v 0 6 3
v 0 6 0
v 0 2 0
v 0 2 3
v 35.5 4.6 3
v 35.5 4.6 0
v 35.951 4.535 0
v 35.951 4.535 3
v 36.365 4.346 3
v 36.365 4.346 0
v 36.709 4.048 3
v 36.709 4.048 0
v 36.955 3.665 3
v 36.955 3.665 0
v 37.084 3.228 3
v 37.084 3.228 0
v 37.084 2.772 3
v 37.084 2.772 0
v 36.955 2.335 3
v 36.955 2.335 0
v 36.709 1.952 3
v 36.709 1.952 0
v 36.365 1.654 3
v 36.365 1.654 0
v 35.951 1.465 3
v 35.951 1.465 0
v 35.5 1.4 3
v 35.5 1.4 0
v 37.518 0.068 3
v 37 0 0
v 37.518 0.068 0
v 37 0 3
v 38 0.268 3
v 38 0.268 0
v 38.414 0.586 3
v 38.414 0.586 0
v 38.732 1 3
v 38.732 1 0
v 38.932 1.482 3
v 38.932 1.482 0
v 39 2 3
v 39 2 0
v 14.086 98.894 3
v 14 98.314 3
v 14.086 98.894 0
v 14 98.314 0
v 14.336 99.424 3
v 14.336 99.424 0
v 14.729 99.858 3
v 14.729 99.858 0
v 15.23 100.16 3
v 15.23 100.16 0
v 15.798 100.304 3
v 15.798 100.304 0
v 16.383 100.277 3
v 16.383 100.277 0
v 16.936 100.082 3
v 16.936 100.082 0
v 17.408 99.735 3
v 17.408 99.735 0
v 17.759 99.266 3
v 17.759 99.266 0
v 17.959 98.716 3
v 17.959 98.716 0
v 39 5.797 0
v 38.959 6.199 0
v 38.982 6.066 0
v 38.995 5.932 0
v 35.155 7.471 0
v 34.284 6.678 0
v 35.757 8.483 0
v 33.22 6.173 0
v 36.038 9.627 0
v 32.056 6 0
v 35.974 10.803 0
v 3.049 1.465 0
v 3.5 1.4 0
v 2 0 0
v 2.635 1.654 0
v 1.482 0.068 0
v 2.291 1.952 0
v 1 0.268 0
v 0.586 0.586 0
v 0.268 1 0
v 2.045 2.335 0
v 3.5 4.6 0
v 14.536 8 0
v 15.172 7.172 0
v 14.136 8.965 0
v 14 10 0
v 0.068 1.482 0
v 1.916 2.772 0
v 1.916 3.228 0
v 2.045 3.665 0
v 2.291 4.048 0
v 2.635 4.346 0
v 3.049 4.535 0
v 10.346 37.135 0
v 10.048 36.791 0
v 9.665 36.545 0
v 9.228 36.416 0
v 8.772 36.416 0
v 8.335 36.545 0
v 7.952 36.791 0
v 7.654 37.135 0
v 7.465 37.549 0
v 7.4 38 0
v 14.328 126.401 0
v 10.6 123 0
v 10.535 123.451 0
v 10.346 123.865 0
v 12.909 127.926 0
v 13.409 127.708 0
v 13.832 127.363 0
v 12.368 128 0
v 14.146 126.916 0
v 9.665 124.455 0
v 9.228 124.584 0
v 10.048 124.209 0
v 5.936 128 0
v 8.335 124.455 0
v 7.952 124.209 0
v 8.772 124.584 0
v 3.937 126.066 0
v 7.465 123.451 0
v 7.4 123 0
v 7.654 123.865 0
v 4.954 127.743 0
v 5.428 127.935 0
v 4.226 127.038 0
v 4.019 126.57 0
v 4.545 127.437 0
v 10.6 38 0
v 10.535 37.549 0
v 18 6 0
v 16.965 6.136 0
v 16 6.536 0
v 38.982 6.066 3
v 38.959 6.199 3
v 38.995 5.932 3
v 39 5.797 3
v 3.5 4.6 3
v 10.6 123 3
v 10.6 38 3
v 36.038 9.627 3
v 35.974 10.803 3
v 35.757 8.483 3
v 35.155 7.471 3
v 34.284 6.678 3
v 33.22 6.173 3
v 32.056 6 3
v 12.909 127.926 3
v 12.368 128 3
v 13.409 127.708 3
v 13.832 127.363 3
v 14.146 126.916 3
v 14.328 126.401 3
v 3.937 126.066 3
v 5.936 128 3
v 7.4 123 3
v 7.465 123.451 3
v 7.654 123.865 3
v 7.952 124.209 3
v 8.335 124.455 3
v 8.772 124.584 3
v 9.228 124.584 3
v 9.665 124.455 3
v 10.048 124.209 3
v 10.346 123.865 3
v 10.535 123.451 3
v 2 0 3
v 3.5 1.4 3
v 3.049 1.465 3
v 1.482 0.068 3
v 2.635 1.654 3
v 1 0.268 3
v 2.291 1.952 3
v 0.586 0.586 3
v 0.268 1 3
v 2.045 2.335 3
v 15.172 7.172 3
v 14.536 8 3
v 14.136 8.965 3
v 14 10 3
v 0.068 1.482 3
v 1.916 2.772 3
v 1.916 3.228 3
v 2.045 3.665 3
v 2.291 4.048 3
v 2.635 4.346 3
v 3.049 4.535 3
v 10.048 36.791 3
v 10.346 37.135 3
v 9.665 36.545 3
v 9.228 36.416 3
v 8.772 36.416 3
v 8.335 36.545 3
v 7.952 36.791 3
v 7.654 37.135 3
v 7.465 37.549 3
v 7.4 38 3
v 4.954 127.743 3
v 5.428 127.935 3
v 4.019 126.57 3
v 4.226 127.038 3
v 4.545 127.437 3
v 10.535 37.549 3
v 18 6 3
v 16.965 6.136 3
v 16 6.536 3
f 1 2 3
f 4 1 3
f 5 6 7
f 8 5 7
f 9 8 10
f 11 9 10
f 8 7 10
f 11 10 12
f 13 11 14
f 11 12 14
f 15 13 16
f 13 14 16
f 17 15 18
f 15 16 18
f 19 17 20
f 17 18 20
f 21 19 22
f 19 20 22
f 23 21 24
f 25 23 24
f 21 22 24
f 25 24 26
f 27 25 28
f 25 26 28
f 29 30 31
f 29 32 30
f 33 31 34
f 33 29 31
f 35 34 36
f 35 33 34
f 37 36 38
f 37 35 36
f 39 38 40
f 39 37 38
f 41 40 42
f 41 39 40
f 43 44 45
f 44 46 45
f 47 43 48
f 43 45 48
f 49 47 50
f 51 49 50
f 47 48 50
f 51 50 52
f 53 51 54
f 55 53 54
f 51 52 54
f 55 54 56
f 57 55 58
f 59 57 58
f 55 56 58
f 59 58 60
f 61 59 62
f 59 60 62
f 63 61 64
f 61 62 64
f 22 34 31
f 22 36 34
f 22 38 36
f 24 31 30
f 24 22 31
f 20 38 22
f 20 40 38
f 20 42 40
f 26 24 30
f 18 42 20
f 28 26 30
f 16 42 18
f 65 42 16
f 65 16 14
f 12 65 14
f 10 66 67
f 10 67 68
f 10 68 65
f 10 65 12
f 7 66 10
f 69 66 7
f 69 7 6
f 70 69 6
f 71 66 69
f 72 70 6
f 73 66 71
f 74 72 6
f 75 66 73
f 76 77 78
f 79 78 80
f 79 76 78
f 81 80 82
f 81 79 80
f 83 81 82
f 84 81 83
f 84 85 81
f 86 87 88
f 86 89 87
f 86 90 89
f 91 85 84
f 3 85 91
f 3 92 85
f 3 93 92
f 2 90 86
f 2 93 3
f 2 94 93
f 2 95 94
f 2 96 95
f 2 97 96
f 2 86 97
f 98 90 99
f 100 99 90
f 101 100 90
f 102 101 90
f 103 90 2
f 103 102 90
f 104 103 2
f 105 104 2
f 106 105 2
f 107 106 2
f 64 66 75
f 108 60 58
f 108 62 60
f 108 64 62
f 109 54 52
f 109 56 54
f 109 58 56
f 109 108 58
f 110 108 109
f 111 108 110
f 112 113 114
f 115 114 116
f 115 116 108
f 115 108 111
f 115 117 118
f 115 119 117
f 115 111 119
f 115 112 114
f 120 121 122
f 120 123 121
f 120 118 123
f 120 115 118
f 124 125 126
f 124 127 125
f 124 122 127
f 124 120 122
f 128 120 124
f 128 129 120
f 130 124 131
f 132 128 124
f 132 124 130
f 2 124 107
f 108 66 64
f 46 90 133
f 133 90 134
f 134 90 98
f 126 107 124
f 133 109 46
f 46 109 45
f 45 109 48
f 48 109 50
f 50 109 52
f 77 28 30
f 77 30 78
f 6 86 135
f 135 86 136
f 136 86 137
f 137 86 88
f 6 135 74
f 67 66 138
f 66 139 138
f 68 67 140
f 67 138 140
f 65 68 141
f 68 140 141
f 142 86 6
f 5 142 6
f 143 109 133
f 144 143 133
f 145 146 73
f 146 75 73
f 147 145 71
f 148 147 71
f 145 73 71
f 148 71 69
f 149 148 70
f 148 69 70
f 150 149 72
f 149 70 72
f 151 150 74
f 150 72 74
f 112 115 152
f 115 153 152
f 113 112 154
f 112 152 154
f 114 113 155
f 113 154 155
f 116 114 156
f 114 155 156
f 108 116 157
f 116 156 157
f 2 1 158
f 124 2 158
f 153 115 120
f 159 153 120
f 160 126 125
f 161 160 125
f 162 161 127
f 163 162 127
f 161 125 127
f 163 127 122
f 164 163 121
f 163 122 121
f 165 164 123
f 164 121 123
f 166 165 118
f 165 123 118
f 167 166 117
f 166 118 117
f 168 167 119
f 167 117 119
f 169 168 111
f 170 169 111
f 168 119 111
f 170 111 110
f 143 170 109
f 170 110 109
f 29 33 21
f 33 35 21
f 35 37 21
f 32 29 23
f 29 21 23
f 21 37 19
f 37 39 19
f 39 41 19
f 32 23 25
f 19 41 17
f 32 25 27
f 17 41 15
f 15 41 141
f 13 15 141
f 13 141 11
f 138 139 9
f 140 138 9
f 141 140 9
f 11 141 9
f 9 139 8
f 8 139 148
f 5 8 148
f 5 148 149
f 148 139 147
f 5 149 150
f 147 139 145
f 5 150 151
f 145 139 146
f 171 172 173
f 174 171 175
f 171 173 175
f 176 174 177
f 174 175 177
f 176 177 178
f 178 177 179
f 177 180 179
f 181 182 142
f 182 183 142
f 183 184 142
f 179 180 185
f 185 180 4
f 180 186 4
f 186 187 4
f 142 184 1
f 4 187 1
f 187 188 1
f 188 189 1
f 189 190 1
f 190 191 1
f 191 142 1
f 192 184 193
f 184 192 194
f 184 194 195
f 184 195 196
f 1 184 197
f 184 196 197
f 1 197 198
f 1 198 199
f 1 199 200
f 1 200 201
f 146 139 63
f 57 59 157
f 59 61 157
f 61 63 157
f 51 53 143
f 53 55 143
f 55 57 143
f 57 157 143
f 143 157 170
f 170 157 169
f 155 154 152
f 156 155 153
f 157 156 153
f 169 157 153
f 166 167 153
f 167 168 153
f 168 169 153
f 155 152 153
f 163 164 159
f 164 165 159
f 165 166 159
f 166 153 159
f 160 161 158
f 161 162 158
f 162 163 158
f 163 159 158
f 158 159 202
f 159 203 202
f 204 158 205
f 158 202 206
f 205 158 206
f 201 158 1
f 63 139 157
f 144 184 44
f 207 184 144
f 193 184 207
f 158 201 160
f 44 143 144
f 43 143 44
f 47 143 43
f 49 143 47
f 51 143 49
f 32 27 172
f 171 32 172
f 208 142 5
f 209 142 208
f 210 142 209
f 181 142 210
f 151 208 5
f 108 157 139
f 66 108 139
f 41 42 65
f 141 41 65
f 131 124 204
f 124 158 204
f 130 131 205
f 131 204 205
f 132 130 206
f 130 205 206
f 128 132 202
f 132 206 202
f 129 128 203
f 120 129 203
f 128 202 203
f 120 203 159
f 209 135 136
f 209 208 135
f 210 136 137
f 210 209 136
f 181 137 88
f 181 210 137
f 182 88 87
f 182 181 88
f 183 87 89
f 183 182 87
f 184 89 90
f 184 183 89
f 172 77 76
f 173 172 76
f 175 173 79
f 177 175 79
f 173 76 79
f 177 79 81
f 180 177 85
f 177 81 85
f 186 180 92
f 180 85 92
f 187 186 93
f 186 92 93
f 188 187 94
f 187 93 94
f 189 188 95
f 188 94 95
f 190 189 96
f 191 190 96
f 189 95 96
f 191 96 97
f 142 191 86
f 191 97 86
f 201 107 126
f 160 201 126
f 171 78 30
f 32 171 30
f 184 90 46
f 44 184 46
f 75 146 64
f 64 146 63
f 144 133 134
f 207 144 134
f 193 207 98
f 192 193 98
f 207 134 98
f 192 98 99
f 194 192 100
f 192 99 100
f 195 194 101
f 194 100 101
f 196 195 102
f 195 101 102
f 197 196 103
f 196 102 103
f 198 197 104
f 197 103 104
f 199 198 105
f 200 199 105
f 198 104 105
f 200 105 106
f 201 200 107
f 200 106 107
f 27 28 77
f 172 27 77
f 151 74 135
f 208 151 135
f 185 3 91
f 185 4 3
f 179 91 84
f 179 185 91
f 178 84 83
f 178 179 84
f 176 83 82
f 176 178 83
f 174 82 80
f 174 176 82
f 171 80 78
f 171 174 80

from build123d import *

# Parameters (mm, degrees)
EXTRUDE_1_DEPTH = 3
EXTRUDE_2_DEPTH = 3
FILLET_1_R      = 2
FILLET_2_R      = 4
FILLET_3_R      = 2


with BuildPart() as part:
    # 草图1 → 凸台-拉伸1 (new body)
    with BuildSketch(Plane.XY):
        Polygon((0, 0), (39, 0), (39, 6), (14, 6), (14, 128), (4, 128), (4, 6), (0, 6), align=None)
        with BuildLine():
            Line((3.5, 4.6), (35.5, 4.6))
            ThreePointArc((35.5, 4.6), (37.1, 3), (35.5, 1.4))
            Line((35.5, 1.4), (3.5, 1.4))
            ThreePointArc((3.5, 1.4), (1.9, 3), (3.5, 4.6))
        make_face(mode=Mode.SUBTRACT)
        with BuildLine():
            Line((7.4, 38), (7.4, 123))
            ThreePointArc((7.4, 123), (9, 124.6), (10.6, 123))
            Line((10.6, 123), (10.6, 38))
            ThreePointArc((10.6, 38), (9, 36.4), (7.4, 38))
        make_face(mode=Mode.SUBTRACT)
    extrude(amount=EXTRUDE_1_DEPTH)

    # 草图2 → 凸台-拉伸2 (add)
    with BuildSketch(Plane.XY.offset(3)):
        Polygon((0, 6), (4, 128), (4, 6), align=None)
        Polygon((14, 128), (39, 6), (36.9584404, 6), (14, 118.037189152), align=None)
    extrude(amount=-EXTRUDE_2_DEPTH)

    # 圆角1
    fillet_1_edges = [part.edges().sort_by_distance(p)[0] for p in [
        (0, 6, 1.5),
        (4, 128, 1.5),
        (14, 128, 1.5),
        (39, 6, 1.5),
        (14, 118.037189152, 1.5),
    ]]
    fillet(fillet_1_edges, radius=FILLET_1_R)

    # 圆角2
    fillet_2_edges = [part.edges().sort_by_distance(p)[0] for p in [
        (14, 6, 1.5),
        (36.9584404, 6, 1.5),
    ]]
    fillet(fillet_2_edges, radius=FILLET_2_R)

    # 圆角3
    fillet_3_edges = [part.edges().sort_by_distance(p)[0] for p in [
        (39, 0, 1.5),
        (0, 0, 1.5),
    ]]
    fillet(fillet_3_edges, radius=FILLET_3_R)


solid = part.part
